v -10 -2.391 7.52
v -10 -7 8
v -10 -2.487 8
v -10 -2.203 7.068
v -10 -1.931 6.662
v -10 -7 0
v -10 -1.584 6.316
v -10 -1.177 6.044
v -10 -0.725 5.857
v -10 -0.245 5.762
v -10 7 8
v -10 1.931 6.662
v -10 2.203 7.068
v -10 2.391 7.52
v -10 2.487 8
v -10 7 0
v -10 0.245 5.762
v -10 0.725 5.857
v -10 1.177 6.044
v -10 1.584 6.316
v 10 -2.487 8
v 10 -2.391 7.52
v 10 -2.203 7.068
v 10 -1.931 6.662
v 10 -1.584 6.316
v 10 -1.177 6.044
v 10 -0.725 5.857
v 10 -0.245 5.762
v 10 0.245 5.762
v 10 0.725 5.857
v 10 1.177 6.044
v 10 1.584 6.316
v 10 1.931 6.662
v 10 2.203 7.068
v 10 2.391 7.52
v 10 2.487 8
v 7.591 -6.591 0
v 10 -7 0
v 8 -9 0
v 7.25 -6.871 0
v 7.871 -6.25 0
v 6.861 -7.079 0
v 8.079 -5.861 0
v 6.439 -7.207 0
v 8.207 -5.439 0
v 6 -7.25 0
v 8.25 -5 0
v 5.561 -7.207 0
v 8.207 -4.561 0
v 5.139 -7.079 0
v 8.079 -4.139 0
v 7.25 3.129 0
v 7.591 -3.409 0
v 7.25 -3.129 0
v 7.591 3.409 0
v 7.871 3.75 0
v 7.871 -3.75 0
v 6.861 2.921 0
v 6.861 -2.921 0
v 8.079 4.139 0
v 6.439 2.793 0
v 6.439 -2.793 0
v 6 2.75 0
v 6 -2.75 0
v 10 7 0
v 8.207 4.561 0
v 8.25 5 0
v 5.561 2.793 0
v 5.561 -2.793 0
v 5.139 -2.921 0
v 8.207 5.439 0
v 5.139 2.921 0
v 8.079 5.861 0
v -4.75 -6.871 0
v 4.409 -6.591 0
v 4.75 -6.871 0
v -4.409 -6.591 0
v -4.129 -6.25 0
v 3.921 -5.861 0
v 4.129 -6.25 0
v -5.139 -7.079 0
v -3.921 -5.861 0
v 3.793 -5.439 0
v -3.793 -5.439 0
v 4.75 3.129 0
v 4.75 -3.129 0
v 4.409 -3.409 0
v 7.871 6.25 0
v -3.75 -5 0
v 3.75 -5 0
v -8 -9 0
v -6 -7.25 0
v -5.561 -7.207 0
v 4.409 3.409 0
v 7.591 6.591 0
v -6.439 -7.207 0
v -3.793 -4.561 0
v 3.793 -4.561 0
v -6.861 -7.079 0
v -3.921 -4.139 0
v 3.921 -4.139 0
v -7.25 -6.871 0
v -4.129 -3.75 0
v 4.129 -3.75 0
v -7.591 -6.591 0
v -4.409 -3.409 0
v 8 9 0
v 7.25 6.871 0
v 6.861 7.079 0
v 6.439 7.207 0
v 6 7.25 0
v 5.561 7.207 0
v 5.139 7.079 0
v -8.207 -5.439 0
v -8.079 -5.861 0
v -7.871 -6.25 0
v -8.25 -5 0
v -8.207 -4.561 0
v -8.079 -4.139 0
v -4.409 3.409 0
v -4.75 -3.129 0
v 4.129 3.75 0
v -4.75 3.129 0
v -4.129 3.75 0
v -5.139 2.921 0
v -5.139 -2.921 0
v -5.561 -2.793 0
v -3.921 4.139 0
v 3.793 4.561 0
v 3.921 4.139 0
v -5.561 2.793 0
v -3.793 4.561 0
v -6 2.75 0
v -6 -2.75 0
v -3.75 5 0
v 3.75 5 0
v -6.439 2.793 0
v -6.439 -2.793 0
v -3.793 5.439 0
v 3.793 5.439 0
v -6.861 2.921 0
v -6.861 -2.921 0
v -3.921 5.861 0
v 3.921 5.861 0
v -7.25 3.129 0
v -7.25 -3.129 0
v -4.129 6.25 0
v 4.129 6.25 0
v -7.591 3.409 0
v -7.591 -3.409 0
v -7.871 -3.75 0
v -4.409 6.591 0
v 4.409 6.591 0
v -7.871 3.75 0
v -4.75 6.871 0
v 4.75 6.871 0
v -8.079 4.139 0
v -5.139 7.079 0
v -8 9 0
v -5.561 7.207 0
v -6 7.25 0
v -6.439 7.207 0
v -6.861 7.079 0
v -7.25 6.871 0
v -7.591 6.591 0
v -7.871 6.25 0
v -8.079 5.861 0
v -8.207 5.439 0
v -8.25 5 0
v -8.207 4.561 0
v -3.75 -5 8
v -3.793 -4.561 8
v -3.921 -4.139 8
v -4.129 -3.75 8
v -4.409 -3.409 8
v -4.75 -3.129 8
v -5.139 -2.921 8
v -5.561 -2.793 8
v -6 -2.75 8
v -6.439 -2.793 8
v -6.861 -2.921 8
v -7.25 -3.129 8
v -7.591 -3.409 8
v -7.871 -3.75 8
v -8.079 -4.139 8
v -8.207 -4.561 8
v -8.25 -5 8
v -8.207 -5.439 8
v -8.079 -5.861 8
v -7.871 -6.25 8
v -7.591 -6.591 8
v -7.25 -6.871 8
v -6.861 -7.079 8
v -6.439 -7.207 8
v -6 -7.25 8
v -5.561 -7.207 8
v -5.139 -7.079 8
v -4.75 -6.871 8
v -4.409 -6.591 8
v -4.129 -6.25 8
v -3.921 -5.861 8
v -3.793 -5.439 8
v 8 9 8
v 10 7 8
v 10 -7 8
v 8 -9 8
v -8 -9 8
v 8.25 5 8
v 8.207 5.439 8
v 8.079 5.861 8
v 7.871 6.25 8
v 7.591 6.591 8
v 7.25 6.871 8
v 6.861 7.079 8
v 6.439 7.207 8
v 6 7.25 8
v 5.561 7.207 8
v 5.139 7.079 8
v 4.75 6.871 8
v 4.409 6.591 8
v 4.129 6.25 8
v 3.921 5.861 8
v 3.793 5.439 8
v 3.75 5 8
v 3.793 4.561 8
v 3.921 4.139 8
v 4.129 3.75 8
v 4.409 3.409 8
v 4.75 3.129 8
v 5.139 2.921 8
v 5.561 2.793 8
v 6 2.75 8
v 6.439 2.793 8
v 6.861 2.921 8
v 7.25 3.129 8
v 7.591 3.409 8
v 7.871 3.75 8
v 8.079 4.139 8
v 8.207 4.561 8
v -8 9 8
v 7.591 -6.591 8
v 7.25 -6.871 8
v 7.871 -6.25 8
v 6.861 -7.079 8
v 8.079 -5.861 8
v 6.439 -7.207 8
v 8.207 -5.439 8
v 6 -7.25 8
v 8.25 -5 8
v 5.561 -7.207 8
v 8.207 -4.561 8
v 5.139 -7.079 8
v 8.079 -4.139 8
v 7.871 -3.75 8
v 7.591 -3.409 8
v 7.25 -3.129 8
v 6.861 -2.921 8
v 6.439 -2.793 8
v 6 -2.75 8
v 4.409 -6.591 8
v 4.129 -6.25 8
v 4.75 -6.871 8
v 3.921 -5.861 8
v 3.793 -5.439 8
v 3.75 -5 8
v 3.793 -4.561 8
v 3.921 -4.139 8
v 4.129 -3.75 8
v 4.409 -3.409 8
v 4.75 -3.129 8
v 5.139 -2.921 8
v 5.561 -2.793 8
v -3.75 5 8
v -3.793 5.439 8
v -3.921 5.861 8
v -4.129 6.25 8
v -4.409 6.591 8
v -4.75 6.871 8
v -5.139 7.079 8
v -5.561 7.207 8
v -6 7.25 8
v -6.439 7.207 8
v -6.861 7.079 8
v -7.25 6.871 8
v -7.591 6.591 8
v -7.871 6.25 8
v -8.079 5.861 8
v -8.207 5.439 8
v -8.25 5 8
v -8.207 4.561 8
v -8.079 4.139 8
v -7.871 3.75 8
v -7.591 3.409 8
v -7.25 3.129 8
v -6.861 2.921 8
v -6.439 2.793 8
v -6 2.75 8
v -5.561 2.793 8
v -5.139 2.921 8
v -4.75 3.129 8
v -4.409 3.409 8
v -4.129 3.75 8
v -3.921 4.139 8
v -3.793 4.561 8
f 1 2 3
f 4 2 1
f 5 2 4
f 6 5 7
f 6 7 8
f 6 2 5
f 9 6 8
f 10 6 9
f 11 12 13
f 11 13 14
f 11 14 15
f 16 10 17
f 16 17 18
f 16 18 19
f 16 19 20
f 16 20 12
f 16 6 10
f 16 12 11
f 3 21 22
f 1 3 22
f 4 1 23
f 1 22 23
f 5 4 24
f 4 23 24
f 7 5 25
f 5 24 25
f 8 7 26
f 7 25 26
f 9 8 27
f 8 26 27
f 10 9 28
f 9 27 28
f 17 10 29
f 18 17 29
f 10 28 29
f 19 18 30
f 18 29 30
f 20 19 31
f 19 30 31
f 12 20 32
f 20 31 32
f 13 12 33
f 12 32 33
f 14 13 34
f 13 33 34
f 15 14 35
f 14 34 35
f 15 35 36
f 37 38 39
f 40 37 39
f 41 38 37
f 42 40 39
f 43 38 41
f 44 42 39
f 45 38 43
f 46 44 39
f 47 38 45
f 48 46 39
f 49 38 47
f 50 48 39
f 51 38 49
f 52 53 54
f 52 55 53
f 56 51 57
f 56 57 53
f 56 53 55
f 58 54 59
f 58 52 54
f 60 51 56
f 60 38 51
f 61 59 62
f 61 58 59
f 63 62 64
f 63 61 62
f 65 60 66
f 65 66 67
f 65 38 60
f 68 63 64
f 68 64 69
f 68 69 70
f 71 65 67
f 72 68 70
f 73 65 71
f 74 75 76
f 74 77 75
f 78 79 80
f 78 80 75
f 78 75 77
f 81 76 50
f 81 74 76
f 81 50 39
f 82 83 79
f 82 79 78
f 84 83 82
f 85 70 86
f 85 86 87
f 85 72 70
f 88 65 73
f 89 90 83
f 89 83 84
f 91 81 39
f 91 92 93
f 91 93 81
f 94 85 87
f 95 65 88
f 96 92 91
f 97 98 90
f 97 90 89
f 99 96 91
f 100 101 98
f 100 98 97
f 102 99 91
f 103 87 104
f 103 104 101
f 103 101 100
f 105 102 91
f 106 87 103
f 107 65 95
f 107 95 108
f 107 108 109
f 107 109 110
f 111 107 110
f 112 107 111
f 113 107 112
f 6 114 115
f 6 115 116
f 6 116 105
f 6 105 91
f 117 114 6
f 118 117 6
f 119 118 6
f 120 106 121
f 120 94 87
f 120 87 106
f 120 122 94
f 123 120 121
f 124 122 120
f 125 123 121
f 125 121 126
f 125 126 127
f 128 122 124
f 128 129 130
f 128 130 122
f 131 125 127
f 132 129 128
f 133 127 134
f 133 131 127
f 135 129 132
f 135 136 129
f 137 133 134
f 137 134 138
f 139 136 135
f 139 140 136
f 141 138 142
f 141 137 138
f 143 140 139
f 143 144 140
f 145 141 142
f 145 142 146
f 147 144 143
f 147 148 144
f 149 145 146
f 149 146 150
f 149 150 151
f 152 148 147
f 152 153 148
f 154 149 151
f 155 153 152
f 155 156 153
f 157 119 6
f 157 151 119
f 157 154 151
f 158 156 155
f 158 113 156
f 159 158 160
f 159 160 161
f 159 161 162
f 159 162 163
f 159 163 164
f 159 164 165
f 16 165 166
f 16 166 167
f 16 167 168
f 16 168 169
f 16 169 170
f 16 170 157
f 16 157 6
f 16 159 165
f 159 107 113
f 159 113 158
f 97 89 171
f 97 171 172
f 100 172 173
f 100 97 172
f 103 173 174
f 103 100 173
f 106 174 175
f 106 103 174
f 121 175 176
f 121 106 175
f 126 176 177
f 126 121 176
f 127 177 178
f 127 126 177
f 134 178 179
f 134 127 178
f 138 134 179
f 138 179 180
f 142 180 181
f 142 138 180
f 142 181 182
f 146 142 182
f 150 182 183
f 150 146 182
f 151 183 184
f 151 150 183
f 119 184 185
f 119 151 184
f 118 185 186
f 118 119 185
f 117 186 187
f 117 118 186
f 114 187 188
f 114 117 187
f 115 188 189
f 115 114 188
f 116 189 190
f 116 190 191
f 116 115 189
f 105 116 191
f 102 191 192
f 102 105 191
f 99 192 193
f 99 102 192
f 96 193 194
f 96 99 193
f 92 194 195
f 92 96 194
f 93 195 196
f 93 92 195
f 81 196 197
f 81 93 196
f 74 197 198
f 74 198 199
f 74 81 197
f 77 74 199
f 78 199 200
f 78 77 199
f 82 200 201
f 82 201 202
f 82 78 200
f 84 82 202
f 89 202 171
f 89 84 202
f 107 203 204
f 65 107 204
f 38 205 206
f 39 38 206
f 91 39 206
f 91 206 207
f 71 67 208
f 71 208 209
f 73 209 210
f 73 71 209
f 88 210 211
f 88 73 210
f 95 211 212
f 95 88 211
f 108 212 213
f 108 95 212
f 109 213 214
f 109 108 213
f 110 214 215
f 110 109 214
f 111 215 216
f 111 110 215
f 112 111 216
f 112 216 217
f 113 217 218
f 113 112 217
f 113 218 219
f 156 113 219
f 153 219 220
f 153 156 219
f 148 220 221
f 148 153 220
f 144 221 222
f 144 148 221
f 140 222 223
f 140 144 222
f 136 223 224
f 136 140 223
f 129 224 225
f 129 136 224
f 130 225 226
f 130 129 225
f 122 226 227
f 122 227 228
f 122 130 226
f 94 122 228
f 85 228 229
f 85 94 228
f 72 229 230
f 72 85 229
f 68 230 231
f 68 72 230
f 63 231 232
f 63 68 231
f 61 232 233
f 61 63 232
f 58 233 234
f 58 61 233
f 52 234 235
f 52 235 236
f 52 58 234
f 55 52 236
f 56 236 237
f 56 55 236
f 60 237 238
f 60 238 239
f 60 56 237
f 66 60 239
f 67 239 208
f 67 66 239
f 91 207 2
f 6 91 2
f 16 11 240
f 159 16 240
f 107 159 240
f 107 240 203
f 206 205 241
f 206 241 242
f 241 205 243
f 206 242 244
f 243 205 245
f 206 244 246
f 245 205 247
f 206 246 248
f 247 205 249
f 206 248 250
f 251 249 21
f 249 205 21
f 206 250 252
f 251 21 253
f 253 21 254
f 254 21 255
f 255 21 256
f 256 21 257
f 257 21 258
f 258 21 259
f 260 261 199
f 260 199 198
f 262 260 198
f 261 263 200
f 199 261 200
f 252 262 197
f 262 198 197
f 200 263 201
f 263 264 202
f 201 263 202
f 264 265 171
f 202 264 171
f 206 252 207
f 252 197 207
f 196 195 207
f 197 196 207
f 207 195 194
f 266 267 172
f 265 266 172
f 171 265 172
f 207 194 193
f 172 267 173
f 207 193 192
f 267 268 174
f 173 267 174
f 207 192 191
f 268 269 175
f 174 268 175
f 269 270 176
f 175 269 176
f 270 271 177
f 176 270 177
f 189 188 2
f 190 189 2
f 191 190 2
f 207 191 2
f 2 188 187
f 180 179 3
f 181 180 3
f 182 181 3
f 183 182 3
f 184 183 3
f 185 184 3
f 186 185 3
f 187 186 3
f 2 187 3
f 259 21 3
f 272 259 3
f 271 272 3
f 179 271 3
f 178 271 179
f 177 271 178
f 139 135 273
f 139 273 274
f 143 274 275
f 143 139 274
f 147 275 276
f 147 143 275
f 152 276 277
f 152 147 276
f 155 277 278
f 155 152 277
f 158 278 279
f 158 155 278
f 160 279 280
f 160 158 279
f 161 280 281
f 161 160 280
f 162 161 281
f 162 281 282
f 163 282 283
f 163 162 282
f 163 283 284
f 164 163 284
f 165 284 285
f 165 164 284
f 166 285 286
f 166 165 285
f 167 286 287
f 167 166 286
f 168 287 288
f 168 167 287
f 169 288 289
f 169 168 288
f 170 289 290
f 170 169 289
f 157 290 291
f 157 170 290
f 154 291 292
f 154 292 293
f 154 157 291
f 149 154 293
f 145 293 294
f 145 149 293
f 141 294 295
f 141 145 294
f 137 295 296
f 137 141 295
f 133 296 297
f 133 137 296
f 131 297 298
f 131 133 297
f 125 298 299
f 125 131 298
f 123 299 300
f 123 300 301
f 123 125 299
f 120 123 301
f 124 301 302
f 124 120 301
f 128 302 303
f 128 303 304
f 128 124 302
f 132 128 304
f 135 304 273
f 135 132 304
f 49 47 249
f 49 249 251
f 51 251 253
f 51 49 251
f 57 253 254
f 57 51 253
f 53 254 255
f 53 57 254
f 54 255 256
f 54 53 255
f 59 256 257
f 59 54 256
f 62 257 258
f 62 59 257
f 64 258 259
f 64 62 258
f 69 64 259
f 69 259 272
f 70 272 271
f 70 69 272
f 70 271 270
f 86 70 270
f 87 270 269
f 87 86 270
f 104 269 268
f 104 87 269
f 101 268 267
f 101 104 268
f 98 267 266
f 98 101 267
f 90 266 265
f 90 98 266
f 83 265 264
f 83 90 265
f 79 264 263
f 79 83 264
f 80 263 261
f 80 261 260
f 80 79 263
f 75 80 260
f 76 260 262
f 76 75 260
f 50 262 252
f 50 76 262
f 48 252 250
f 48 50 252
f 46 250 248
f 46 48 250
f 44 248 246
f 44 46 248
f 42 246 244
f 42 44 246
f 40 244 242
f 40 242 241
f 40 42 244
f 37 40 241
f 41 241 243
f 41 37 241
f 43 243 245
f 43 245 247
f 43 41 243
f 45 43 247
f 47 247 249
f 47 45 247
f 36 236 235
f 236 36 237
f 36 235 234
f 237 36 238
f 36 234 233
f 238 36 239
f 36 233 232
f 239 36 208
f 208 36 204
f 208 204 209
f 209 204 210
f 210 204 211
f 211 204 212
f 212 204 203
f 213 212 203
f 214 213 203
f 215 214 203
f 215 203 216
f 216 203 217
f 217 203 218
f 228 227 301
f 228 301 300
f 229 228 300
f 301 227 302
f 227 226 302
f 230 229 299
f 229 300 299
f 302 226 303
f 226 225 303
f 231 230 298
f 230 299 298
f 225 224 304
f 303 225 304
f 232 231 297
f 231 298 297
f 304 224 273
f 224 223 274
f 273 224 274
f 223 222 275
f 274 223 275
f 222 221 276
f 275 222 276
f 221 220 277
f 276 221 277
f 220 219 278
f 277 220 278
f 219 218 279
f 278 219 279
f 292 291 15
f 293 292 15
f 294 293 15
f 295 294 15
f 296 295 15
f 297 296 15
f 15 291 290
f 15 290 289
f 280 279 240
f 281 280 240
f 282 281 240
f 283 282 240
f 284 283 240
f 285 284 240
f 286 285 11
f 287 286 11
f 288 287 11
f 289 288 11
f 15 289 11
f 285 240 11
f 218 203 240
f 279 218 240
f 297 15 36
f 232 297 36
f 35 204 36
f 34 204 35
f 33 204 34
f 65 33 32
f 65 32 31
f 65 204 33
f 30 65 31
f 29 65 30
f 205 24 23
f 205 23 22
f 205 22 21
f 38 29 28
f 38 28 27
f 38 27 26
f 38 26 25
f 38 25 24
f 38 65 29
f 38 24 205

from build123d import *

# Parameters (mm, degrees)
SKETCH2_R           = 2.25
BOSS_EXTRUDE1_DEPTH = 8
CUT_EXTRUDE1_REACH  = 25.345
SKETCH3_R           = 2.5


with BuildPart() as part:
    # Sketch2 → Boss-Extrude1 (new body)
    with BuildSketch(Plane.XY):
        Polygon((-8, 9), (8, 9), (10, 7), (10, -7), (8, -9), (-8, -9), (-10, -7), (-10, 7), align=None)
        with Locations((-6, 5)):
            Circle(SKETCH2_R, mode=Mode.SUBTRACT)
        with Locations((-6, -5)):
            Circle(SKETCH2_R, mode=Mode.SUBTRACT)
        with Locations((6, 5)):
            Circle(SKETCH2_R, mode=Mode.SUBTRACT)
        with Locations((6, -5)):
            Circle(SKETCH2_R, mode=Mode.SUBTRACT)
    extrude(amount=BOSS_EXTRUDE1_DEPTH)

    # Sketch3 → Cut-Extrude1 (cut, up to next)
    with BuildSketch(Plane(origin=(10, 0, 0), x_dir=(0, 0, -1), z_dir=(1, 0, 0)), mode=Mode.PRIVATE) as cut_extrude1_sk1:
        with Locations((-8.25, 0)):
            Circle(SKETCH3_R)
    cut_extrude1_tool1 = extrude(cut_extrude1_sk1.sketch, amount=-CUT_EXTRUDE1_REACH, mode=Mode.PRIVATE) & part.part
    add(cut_extrude1_tool1.solids().sort_by_distance((10, 0, 8.25))[0], mode=Mode.SUBTRACT)


solid = part.part
